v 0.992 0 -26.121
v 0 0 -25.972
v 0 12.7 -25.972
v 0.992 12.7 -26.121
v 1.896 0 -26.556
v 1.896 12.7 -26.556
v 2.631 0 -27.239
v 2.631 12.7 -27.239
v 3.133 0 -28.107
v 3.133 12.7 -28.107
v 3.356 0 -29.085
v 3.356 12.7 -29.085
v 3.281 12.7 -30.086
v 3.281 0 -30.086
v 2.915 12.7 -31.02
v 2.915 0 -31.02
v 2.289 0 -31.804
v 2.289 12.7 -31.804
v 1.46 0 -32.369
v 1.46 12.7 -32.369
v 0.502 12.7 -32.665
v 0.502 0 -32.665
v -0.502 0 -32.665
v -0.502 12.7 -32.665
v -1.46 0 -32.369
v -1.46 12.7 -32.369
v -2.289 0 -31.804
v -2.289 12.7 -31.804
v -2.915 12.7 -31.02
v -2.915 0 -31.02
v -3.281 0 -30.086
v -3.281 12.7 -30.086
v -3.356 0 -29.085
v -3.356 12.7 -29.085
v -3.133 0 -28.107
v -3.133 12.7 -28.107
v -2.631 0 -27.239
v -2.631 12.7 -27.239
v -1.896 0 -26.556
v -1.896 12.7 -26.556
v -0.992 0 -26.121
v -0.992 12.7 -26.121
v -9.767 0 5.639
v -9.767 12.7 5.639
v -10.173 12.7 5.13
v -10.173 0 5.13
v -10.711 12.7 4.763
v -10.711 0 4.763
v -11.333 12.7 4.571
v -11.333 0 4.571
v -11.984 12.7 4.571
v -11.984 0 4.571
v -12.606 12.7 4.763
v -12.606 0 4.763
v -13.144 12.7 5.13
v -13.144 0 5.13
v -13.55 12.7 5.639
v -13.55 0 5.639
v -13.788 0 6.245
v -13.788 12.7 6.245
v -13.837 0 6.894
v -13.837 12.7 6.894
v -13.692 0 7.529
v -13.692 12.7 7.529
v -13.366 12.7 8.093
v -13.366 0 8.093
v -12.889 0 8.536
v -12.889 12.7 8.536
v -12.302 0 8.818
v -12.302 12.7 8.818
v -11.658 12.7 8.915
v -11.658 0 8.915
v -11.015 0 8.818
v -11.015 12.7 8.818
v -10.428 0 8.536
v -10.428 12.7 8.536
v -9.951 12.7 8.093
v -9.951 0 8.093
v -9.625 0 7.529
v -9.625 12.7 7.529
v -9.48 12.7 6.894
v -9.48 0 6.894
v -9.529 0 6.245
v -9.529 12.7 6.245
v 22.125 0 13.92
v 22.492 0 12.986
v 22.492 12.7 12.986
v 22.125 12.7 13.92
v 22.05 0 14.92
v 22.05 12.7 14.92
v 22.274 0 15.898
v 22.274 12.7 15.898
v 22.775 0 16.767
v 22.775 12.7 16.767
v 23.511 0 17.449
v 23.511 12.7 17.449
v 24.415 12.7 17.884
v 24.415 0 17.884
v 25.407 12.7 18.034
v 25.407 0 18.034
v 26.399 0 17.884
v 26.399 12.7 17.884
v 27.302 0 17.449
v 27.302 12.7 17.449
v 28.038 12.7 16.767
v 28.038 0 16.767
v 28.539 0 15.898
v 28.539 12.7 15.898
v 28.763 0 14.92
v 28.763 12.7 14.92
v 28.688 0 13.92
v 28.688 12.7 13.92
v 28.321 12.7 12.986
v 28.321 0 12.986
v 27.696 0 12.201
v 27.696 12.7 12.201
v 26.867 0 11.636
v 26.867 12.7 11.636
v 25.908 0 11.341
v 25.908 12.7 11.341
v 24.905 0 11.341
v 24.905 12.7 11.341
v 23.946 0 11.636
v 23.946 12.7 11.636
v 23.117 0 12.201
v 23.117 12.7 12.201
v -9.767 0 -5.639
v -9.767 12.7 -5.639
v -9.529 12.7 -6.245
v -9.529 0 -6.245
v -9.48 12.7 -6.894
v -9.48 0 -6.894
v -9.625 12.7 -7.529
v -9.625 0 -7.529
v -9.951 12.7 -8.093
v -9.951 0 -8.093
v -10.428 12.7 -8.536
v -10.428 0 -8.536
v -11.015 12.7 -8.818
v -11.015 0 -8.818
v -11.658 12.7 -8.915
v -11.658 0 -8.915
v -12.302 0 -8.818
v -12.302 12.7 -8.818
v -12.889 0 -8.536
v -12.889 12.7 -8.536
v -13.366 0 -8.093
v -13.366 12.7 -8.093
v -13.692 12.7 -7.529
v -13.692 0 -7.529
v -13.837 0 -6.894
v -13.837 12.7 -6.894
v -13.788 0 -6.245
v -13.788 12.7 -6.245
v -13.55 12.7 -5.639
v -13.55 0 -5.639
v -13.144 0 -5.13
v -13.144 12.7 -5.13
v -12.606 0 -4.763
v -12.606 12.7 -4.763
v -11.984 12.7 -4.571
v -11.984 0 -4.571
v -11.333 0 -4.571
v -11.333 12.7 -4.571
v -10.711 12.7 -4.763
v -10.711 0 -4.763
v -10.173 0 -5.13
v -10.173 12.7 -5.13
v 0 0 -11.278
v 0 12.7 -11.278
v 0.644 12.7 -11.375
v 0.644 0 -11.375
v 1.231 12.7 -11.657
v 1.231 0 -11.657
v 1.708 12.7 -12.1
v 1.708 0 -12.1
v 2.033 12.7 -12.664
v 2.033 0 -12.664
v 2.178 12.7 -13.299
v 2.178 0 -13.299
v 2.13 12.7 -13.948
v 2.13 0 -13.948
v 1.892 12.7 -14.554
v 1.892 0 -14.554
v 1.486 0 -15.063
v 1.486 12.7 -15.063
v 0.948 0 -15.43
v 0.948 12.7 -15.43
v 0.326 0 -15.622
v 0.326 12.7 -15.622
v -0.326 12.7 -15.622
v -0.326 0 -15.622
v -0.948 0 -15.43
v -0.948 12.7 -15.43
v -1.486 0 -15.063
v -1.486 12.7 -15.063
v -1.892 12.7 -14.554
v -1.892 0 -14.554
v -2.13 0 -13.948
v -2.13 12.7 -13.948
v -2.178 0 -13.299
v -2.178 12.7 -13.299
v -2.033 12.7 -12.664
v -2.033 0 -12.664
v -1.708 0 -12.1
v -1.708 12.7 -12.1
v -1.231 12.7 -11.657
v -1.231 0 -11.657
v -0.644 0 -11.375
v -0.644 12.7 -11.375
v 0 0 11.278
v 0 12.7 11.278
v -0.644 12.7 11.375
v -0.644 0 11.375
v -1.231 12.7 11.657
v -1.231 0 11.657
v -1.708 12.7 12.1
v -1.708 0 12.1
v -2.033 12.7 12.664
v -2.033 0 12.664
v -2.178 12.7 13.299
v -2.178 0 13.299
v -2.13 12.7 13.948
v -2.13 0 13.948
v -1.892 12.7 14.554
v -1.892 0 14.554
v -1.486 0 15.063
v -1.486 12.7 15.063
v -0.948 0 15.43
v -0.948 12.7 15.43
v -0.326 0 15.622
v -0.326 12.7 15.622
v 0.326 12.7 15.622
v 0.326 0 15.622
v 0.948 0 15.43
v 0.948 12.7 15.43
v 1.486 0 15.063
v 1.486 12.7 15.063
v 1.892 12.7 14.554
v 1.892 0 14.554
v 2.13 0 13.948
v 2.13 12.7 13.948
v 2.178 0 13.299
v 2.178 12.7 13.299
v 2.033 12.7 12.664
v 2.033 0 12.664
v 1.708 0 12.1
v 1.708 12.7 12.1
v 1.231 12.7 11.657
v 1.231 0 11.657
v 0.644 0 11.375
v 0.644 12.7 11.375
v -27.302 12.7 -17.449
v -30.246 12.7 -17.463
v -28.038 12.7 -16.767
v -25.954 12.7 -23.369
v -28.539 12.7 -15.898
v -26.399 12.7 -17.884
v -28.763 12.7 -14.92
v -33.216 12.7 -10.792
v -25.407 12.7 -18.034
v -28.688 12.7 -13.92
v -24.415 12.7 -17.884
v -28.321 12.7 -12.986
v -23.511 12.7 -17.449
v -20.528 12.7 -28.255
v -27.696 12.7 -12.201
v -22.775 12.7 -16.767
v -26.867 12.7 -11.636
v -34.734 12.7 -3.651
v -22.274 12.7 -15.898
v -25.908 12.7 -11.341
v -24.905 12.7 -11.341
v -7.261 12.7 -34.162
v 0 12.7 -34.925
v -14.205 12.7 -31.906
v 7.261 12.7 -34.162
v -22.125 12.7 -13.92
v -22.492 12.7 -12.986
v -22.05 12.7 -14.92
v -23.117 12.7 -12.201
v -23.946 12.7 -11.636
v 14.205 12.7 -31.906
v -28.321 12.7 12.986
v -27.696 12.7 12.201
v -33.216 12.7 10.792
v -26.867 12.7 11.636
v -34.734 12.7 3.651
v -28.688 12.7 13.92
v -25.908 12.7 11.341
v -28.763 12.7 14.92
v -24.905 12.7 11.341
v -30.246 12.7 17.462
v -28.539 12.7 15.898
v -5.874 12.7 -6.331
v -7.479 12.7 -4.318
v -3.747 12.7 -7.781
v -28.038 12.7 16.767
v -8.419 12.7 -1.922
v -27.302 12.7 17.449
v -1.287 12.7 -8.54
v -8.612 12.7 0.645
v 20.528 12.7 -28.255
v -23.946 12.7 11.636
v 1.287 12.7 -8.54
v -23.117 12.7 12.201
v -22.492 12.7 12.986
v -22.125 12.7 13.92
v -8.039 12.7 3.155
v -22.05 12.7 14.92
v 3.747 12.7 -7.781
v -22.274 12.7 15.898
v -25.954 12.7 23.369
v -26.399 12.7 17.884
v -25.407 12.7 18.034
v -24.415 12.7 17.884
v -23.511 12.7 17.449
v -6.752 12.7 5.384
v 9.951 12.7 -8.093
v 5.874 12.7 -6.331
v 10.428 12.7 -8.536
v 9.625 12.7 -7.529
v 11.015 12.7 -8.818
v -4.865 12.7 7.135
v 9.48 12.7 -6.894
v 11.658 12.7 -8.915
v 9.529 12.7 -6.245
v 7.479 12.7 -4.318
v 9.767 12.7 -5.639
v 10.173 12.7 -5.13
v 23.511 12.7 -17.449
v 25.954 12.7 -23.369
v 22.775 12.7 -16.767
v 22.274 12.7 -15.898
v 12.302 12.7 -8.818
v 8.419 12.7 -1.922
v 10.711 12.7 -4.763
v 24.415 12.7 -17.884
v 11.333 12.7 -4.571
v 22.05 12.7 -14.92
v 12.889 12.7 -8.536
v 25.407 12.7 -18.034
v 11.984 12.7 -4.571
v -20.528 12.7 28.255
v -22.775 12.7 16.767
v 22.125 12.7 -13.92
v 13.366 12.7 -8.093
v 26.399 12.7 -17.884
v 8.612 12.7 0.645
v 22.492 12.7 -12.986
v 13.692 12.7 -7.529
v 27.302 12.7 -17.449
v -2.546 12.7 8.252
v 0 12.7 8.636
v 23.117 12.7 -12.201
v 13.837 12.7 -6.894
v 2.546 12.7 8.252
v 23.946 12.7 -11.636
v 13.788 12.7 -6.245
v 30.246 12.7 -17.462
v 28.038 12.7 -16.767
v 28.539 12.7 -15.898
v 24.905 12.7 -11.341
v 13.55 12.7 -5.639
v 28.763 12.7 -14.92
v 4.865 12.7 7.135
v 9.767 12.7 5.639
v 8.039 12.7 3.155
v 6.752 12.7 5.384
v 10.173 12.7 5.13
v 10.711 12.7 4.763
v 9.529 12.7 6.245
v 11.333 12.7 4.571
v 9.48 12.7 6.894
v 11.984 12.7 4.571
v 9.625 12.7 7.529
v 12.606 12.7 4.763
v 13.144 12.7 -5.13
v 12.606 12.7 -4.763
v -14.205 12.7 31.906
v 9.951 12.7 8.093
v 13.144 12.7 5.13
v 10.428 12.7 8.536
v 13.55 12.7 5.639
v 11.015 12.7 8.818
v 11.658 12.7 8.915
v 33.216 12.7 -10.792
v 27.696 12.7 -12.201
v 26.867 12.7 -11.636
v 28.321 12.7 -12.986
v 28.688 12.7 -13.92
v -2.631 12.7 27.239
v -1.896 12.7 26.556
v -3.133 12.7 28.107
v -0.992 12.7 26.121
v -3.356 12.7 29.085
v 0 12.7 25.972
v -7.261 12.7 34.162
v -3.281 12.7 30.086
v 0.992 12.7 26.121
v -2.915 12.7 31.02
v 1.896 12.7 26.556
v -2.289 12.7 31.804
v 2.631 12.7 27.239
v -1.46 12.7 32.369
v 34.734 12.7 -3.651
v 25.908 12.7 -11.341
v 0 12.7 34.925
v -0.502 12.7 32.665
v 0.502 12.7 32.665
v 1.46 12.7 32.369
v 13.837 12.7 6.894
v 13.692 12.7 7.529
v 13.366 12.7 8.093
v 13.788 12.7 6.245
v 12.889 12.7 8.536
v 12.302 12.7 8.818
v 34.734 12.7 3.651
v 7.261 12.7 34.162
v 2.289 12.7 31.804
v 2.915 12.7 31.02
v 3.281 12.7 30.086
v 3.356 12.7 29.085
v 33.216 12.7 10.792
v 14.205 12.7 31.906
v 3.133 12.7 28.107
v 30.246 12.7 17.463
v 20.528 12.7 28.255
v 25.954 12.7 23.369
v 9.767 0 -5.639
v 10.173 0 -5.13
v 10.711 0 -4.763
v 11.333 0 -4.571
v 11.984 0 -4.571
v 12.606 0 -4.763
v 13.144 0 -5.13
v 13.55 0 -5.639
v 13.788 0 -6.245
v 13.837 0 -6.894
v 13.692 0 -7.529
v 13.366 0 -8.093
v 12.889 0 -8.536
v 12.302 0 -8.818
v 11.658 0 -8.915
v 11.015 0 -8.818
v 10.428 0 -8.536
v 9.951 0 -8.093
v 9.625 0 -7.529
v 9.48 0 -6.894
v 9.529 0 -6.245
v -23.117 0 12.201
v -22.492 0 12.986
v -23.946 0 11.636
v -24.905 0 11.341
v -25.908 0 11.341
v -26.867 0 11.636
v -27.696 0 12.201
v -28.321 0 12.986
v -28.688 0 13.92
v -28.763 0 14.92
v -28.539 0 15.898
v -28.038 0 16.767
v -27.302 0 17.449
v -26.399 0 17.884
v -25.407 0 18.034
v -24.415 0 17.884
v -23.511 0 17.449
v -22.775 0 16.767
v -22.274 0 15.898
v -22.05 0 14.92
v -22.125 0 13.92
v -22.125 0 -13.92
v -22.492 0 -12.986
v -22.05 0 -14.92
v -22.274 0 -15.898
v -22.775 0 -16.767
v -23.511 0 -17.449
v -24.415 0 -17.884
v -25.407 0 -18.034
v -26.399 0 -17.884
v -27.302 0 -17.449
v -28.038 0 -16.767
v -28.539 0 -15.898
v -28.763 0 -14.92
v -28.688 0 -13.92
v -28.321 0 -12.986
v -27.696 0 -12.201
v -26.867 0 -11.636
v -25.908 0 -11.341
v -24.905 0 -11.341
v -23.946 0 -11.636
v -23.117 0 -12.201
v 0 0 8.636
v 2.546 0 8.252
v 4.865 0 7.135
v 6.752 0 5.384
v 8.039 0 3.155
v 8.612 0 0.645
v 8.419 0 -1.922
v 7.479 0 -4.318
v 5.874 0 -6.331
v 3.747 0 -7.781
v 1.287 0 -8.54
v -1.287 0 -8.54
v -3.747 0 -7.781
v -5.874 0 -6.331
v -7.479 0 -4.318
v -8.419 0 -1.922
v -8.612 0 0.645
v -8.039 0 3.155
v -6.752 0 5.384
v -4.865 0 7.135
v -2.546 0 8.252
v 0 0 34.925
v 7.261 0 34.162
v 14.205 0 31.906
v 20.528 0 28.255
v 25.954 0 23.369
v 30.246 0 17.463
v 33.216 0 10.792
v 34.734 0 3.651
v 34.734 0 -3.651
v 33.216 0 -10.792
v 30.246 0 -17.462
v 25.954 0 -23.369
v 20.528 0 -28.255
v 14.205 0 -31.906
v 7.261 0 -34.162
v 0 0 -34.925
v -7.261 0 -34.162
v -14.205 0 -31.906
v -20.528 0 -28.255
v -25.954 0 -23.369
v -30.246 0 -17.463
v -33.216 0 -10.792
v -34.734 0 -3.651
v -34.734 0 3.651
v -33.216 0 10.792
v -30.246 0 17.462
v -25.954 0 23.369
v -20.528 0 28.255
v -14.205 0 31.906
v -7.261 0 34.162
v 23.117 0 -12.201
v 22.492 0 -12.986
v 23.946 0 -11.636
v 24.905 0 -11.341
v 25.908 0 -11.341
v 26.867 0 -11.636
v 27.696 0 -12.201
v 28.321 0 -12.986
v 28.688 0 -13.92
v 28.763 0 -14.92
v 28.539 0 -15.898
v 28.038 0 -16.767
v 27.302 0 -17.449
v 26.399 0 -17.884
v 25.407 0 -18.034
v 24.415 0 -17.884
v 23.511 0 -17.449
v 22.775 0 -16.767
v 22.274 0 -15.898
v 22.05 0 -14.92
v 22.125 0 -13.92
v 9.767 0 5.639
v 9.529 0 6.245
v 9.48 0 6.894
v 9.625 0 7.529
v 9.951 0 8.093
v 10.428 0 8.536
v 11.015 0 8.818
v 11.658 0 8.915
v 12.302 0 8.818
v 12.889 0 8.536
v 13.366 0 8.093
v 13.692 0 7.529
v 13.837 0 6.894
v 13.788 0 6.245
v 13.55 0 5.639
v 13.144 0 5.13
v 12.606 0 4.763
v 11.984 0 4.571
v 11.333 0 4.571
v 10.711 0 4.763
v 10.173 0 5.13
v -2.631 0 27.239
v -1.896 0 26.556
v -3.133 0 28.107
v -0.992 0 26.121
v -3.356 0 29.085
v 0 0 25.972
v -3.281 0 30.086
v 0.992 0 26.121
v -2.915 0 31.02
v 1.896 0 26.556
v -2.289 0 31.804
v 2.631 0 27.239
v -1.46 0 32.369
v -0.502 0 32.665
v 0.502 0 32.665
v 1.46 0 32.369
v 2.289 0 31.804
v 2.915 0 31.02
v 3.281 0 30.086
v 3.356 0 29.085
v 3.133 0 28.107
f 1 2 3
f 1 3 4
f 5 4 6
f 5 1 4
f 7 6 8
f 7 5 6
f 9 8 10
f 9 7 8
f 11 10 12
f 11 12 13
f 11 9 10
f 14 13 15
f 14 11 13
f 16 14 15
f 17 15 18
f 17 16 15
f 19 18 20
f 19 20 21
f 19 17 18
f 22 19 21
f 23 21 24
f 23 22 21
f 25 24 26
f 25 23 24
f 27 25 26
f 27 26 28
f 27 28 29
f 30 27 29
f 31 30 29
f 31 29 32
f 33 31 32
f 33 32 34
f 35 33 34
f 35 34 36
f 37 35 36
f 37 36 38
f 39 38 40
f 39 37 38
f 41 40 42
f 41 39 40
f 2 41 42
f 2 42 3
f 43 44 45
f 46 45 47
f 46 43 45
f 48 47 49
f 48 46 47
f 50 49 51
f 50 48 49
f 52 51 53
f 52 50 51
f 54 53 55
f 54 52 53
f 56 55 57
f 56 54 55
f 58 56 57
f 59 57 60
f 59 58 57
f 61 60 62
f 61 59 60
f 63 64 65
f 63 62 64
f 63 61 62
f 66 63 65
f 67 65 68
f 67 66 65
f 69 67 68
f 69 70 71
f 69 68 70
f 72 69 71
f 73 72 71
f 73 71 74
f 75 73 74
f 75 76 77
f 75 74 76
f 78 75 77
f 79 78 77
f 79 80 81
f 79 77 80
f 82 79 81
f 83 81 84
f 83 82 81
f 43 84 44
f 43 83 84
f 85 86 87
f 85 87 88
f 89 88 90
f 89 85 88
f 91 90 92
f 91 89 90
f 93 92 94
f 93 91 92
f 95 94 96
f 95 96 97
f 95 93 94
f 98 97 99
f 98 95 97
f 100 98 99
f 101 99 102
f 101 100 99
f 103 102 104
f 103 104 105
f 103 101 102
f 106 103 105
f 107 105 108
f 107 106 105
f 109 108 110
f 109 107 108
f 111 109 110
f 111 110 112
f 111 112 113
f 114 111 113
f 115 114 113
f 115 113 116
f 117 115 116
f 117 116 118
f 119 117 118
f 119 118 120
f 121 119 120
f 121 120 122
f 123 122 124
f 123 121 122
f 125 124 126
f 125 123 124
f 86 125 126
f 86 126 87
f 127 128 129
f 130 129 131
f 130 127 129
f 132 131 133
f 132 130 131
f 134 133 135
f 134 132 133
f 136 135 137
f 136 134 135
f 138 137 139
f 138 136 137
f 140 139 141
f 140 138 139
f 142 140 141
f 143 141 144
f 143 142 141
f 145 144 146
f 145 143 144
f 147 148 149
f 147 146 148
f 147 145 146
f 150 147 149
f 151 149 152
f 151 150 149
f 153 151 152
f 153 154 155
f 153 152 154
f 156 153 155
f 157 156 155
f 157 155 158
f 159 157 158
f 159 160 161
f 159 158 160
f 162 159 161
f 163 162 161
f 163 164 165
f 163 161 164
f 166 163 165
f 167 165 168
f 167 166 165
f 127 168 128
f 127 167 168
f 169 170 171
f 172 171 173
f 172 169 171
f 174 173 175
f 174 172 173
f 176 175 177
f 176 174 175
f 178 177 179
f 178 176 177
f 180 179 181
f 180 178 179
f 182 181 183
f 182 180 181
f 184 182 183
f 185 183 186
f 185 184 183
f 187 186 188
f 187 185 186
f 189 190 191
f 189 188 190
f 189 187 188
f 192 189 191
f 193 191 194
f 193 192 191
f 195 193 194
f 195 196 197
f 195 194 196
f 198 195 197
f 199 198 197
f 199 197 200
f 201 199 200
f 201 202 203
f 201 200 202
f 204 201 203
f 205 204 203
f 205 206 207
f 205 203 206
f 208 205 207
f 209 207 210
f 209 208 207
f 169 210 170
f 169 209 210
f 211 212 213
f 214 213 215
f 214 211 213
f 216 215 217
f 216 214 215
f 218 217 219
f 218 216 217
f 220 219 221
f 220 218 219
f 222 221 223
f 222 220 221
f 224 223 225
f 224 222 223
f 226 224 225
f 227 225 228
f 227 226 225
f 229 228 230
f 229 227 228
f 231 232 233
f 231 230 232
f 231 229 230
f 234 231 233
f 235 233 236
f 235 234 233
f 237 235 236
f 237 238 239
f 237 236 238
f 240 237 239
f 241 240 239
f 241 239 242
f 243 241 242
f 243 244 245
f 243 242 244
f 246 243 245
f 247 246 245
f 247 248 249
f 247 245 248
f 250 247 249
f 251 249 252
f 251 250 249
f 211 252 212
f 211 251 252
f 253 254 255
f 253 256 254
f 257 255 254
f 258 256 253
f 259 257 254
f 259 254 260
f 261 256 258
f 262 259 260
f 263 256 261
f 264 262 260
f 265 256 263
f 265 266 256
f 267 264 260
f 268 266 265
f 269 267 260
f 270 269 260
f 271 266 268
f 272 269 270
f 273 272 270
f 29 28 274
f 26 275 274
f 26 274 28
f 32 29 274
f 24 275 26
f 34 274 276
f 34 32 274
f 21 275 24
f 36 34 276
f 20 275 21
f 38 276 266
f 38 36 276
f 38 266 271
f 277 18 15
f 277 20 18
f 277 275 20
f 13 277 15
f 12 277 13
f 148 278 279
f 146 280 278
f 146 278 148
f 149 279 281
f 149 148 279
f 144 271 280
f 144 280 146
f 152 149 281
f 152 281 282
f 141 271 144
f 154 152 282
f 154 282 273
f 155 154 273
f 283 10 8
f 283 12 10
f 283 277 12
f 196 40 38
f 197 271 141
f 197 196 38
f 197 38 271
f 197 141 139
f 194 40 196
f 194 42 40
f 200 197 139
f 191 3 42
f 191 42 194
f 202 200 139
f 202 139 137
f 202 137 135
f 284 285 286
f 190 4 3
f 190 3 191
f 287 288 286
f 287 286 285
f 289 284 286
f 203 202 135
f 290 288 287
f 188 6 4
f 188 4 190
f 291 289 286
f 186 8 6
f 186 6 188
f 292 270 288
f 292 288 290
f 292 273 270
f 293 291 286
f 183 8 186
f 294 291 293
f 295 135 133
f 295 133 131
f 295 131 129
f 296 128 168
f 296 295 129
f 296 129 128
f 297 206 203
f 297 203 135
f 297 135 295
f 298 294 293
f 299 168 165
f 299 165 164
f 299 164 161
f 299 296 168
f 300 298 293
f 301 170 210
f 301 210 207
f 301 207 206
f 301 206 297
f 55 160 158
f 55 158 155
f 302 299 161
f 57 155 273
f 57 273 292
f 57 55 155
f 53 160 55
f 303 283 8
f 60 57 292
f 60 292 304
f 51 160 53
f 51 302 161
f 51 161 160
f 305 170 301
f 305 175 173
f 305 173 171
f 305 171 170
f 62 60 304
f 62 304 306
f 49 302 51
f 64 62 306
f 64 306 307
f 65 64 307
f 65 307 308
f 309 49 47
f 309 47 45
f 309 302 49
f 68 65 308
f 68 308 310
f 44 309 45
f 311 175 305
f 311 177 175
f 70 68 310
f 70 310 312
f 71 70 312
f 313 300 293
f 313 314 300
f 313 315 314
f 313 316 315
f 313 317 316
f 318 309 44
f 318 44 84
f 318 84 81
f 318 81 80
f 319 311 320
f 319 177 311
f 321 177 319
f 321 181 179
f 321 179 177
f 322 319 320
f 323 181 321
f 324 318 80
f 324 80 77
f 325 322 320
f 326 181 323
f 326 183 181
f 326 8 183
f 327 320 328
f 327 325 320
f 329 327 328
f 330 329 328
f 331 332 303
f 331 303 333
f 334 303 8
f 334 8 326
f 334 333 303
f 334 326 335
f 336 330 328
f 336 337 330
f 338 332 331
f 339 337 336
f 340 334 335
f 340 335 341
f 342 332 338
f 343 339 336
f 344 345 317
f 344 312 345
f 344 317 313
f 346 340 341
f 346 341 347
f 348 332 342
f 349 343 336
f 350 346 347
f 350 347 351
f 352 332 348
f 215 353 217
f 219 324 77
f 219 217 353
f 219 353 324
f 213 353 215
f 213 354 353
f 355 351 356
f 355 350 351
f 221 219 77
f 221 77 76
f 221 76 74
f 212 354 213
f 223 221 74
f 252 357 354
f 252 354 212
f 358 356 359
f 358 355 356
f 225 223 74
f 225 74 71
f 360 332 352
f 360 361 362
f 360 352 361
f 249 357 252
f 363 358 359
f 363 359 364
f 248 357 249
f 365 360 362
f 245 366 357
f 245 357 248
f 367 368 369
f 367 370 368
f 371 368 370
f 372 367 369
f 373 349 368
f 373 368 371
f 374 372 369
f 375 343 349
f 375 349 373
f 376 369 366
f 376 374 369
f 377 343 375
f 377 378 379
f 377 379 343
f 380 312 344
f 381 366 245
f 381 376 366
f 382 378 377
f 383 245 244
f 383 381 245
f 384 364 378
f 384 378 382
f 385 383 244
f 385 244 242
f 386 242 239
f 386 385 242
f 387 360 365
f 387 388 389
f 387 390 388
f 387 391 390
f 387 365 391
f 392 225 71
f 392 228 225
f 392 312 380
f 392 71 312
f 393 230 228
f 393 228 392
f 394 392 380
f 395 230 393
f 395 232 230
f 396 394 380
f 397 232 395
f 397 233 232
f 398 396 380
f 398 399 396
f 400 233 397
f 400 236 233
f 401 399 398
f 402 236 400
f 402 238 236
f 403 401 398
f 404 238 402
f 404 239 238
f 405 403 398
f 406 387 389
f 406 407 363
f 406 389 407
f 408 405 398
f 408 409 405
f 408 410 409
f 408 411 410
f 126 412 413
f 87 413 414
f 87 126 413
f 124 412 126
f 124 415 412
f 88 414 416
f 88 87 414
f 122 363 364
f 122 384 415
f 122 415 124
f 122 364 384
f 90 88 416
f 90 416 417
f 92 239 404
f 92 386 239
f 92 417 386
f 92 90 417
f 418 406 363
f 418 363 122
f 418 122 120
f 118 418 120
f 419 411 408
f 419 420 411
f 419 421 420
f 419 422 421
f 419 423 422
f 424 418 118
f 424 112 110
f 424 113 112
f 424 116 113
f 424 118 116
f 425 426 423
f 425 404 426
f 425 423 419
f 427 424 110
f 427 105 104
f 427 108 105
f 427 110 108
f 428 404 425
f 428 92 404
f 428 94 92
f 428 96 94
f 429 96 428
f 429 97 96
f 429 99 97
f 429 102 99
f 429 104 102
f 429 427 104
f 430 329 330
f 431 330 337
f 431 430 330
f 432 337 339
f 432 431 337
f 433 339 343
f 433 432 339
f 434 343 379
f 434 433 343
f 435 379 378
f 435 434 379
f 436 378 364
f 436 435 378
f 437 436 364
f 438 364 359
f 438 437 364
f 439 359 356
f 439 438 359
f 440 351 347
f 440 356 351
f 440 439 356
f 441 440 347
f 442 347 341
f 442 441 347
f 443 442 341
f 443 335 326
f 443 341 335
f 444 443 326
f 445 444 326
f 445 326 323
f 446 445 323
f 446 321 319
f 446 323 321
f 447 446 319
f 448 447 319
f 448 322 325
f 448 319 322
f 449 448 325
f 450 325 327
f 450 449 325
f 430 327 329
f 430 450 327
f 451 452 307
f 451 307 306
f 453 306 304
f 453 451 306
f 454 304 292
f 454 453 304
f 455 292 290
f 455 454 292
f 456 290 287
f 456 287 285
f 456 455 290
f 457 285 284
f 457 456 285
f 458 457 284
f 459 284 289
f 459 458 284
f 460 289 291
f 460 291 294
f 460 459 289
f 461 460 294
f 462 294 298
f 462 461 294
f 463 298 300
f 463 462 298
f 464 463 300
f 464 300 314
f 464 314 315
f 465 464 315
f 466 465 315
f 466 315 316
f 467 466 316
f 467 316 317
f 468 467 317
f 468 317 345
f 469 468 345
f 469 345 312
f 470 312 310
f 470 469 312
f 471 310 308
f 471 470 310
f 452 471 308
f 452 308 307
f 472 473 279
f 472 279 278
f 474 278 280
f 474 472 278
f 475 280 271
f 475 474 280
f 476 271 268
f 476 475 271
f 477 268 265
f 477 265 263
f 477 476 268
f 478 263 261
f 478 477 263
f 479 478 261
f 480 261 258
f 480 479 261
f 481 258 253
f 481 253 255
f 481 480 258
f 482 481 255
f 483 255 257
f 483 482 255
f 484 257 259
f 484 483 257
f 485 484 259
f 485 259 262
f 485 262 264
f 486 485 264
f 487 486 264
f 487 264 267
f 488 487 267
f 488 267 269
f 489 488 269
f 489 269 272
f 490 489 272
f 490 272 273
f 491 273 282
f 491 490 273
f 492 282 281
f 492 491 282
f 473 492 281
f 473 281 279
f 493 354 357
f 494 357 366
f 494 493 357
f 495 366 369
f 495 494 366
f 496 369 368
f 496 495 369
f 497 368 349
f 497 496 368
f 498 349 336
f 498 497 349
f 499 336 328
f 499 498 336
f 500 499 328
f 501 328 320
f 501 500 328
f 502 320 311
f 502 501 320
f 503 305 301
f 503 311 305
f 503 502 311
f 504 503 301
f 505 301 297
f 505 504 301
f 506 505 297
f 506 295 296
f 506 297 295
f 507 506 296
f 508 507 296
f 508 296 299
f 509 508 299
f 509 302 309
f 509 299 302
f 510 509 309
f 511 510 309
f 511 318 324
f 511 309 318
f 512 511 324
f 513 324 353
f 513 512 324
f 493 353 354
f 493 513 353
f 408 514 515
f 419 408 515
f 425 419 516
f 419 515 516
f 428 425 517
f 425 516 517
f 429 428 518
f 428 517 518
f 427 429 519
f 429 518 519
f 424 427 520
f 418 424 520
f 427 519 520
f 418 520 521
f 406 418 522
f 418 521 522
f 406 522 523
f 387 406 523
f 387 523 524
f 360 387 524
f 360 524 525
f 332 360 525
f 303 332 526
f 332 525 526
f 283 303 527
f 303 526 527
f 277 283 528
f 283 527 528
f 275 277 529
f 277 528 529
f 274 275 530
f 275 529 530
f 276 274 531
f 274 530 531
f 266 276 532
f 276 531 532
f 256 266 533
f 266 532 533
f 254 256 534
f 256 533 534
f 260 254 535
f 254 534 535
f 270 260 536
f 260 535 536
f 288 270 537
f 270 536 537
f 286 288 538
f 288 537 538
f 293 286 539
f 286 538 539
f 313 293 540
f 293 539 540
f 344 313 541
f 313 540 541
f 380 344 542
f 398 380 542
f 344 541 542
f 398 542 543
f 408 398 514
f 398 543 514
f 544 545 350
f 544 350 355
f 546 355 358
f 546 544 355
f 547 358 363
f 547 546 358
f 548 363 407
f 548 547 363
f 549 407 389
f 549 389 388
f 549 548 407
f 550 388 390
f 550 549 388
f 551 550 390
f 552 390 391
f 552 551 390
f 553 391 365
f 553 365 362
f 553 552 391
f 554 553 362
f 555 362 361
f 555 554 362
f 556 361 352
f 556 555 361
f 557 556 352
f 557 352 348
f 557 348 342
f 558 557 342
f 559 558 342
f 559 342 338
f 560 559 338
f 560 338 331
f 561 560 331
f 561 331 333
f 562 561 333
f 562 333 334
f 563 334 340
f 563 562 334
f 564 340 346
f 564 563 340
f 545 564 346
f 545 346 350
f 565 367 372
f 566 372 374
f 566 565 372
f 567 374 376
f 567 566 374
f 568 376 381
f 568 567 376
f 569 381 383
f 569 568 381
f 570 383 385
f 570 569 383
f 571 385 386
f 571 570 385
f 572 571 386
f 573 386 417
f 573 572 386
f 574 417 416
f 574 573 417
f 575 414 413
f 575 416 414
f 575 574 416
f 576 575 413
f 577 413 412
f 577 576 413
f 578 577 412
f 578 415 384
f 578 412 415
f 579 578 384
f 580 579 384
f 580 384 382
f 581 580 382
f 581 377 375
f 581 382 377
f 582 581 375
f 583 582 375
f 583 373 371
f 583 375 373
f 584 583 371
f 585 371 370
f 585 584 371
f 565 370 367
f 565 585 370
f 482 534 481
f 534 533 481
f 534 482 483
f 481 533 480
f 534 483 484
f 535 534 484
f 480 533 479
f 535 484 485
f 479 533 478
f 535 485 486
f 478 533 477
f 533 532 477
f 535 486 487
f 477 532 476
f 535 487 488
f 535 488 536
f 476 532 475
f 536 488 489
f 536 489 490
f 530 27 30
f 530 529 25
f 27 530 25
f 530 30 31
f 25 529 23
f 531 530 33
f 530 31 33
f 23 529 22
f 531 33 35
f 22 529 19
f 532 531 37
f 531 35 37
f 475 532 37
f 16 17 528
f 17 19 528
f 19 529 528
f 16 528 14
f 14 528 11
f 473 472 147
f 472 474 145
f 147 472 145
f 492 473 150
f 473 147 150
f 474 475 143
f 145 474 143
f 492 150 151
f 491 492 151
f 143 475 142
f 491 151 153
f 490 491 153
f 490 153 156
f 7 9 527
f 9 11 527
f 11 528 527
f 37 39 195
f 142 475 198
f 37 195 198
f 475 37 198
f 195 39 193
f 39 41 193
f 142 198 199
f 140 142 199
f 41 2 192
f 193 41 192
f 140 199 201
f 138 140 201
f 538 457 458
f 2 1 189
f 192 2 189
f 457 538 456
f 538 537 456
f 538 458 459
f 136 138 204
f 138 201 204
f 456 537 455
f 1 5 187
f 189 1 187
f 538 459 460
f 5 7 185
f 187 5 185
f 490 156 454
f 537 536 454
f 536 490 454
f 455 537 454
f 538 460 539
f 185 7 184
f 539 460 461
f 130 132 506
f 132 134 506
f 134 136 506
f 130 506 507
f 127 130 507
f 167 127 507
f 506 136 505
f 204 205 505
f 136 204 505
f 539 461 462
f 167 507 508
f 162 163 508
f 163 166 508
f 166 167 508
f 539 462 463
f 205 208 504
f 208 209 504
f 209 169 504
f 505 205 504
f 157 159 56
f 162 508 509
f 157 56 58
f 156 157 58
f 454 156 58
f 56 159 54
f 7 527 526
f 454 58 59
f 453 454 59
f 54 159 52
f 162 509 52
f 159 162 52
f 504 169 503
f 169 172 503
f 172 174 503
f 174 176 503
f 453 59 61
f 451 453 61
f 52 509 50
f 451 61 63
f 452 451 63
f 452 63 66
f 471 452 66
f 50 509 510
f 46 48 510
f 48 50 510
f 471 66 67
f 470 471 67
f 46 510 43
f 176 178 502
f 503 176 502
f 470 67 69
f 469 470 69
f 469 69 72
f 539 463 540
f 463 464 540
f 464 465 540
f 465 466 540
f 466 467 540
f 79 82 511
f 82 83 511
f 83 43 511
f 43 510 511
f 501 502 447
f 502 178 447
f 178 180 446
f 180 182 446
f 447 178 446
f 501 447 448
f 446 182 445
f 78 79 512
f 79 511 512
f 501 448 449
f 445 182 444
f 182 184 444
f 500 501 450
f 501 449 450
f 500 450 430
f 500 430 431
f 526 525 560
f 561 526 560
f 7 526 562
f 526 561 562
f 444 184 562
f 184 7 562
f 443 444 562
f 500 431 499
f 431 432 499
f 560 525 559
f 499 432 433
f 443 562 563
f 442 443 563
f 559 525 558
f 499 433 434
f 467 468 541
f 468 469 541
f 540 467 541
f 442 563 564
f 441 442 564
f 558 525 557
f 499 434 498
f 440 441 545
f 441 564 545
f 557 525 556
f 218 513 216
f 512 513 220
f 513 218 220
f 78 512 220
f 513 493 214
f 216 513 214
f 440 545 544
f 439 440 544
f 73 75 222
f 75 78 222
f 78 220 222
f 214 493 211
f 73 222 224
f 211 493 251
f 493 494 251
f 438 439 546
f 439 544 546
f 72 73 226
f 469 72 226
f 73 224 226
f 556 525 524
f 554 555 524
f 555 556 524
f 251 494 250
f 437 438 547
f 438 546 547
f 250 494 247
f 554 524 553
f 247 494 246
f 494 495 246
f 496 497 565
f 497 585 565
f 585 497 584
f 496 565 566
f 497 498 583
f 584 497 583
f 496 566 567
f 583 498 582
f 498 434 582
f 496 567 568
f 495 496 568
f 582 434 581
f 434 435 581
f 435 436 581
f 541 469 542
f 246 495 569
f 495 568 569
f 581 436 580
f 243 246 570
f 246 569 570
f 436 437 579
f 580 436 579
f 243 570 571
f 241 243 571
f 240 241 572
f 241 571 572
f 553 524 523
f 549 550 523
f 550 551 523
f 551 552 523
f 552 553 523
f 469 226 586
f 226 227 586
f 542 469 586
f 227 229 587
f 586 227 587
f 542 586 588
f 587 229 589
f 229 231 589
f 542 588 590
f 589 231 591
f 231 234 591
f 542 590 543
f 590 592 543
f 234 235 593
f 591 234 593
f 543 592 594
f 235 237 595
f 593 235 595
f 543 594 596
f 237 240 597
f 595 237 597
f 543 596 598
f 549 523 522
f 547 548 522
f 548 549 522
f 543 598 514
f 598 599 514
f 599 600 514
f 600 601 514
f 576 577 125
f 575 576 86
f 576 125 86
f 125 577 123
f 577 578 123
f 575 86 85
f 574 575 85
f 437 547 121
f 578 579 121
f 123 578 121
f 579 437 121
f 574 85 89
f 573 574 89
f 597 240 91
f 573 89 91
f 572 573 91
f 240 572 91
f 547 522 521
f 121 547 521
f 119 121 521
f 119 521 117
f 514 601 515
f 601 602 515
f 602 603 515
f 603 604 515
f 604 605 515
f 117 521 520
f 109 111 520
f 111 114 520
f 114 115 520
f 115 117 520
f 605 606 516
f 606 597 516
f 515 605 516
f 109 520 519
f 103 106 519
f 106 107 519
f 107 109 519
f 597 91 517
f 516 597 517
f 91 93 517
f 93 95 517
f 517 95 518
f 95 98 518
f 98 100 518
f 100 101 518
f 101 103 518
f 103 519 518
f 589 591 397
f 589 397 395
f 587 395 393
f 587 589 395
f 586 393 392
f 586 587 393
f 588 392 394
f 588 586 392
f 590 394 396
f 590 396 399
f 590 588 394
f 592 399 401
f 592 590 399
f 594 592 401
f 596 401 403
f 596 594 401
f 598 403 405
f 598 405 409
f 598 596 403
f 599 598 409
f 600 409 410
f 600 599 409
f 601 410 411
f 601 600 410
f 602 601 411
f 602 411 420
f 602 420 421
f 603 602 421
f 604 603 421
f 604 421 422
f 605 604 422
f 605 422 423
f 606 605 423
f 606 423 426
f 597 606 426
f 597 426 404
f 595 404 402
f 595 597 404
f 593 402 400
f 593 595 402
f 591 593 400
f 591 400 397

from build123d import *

# Parameters (mm, degrees)
SKETCH1_R          = 34.925
EXTRUDE1_DEPTH     = 12.7
SKETCH2_R          = 8.636
CUT_EXTRUDE1_DEPTH = 51.998051433
SKETCH3_R          = 3.3655
CUT_EXTRUDE2_DEPTH = 12.7
CIRPATTERN1_COUNT  = 6
SKETCH5_R          = 2.1844
CUT_EXTRUDE4_DEPTH = 51.998051433
CIRPATTERN2_COUNT  = 6


with BuildPart() as part:
    # Sketch1 → Extrude1 (new body)
    with BuildSketch(Plane(origin=(0, 0, 0), x_dir=(1, 0, 0), z_dir=(0, 1, 0))):
        Circle(SKETCH1_R)
    extrude(amount=EXTRUDE1_DEPTH)

    # Sketch2 → Cut-Extrude1 (cut, through all)
    with BuildSketch(Plane(origin=(0, 0, 0), x_dir=(1, 0, 0), z_dir=(0, 1, 0))):
        Circle(SKETCH2_R)
    extrude(amount=CUT_EXTRUDE1_DEPTH, mode=Mode.SUBTRACT)

    # Sketch3 → Cut-Extrude2 (cut)
    with BuildSketch(Plane(origin=(0, 0, 0), x_dir=(1, 0, 0), z_dir=(0, 1, 0))):
        with Locations((0, 29.337)):
            Circle(SKETCH3_R)
    cut_extrude2 = extrude(amount=CUT_EXTRUDE2_DEPTH, mode=Mode.SUBTRACT)

    # CirPattern1: Cut-Extrude2 ×6 about axis
    cirpattern1_axis = Axis((0, 35.858162691, 0), (0, -1, 0))
    for i in range(1, CIRPATTERN1_COUNT):
        add(cut_extrude2.rotate(cirpattern1_axis, i * 360 / CIRPATTERN1_COUNT), mode=Mode.SUBTRACT)

    # Sketch5 → Cut-Extrude4 (cut, through all)
    with BuildSketch(Plane(origin=(0, 0, 0), x_dir=(1, 0, 0), z_dir=(0, 1, 0))):
        with Locations((0, 13.462)):
            Circle(SKETCH5_R)
    cut_extrude4 = extrude(amount=CUT_EXTRUDE4_DEPTH, mode=Mode.SUBTRACT)

    # CirPattern2: Cut-Extrude4 ×6 about axis
    cirpattern2_axis = Axis((0, 35.858162691, 0), (0, -1, 0))
    for i in range(1, CIRPATTERN2_COUNT):
        add(cut_extrude4.rotate(cirpattern2_axis, i * 360 / CIRPATTERN2_COUNT), mode=Mode.SUBTRACT)


solid = part.part
